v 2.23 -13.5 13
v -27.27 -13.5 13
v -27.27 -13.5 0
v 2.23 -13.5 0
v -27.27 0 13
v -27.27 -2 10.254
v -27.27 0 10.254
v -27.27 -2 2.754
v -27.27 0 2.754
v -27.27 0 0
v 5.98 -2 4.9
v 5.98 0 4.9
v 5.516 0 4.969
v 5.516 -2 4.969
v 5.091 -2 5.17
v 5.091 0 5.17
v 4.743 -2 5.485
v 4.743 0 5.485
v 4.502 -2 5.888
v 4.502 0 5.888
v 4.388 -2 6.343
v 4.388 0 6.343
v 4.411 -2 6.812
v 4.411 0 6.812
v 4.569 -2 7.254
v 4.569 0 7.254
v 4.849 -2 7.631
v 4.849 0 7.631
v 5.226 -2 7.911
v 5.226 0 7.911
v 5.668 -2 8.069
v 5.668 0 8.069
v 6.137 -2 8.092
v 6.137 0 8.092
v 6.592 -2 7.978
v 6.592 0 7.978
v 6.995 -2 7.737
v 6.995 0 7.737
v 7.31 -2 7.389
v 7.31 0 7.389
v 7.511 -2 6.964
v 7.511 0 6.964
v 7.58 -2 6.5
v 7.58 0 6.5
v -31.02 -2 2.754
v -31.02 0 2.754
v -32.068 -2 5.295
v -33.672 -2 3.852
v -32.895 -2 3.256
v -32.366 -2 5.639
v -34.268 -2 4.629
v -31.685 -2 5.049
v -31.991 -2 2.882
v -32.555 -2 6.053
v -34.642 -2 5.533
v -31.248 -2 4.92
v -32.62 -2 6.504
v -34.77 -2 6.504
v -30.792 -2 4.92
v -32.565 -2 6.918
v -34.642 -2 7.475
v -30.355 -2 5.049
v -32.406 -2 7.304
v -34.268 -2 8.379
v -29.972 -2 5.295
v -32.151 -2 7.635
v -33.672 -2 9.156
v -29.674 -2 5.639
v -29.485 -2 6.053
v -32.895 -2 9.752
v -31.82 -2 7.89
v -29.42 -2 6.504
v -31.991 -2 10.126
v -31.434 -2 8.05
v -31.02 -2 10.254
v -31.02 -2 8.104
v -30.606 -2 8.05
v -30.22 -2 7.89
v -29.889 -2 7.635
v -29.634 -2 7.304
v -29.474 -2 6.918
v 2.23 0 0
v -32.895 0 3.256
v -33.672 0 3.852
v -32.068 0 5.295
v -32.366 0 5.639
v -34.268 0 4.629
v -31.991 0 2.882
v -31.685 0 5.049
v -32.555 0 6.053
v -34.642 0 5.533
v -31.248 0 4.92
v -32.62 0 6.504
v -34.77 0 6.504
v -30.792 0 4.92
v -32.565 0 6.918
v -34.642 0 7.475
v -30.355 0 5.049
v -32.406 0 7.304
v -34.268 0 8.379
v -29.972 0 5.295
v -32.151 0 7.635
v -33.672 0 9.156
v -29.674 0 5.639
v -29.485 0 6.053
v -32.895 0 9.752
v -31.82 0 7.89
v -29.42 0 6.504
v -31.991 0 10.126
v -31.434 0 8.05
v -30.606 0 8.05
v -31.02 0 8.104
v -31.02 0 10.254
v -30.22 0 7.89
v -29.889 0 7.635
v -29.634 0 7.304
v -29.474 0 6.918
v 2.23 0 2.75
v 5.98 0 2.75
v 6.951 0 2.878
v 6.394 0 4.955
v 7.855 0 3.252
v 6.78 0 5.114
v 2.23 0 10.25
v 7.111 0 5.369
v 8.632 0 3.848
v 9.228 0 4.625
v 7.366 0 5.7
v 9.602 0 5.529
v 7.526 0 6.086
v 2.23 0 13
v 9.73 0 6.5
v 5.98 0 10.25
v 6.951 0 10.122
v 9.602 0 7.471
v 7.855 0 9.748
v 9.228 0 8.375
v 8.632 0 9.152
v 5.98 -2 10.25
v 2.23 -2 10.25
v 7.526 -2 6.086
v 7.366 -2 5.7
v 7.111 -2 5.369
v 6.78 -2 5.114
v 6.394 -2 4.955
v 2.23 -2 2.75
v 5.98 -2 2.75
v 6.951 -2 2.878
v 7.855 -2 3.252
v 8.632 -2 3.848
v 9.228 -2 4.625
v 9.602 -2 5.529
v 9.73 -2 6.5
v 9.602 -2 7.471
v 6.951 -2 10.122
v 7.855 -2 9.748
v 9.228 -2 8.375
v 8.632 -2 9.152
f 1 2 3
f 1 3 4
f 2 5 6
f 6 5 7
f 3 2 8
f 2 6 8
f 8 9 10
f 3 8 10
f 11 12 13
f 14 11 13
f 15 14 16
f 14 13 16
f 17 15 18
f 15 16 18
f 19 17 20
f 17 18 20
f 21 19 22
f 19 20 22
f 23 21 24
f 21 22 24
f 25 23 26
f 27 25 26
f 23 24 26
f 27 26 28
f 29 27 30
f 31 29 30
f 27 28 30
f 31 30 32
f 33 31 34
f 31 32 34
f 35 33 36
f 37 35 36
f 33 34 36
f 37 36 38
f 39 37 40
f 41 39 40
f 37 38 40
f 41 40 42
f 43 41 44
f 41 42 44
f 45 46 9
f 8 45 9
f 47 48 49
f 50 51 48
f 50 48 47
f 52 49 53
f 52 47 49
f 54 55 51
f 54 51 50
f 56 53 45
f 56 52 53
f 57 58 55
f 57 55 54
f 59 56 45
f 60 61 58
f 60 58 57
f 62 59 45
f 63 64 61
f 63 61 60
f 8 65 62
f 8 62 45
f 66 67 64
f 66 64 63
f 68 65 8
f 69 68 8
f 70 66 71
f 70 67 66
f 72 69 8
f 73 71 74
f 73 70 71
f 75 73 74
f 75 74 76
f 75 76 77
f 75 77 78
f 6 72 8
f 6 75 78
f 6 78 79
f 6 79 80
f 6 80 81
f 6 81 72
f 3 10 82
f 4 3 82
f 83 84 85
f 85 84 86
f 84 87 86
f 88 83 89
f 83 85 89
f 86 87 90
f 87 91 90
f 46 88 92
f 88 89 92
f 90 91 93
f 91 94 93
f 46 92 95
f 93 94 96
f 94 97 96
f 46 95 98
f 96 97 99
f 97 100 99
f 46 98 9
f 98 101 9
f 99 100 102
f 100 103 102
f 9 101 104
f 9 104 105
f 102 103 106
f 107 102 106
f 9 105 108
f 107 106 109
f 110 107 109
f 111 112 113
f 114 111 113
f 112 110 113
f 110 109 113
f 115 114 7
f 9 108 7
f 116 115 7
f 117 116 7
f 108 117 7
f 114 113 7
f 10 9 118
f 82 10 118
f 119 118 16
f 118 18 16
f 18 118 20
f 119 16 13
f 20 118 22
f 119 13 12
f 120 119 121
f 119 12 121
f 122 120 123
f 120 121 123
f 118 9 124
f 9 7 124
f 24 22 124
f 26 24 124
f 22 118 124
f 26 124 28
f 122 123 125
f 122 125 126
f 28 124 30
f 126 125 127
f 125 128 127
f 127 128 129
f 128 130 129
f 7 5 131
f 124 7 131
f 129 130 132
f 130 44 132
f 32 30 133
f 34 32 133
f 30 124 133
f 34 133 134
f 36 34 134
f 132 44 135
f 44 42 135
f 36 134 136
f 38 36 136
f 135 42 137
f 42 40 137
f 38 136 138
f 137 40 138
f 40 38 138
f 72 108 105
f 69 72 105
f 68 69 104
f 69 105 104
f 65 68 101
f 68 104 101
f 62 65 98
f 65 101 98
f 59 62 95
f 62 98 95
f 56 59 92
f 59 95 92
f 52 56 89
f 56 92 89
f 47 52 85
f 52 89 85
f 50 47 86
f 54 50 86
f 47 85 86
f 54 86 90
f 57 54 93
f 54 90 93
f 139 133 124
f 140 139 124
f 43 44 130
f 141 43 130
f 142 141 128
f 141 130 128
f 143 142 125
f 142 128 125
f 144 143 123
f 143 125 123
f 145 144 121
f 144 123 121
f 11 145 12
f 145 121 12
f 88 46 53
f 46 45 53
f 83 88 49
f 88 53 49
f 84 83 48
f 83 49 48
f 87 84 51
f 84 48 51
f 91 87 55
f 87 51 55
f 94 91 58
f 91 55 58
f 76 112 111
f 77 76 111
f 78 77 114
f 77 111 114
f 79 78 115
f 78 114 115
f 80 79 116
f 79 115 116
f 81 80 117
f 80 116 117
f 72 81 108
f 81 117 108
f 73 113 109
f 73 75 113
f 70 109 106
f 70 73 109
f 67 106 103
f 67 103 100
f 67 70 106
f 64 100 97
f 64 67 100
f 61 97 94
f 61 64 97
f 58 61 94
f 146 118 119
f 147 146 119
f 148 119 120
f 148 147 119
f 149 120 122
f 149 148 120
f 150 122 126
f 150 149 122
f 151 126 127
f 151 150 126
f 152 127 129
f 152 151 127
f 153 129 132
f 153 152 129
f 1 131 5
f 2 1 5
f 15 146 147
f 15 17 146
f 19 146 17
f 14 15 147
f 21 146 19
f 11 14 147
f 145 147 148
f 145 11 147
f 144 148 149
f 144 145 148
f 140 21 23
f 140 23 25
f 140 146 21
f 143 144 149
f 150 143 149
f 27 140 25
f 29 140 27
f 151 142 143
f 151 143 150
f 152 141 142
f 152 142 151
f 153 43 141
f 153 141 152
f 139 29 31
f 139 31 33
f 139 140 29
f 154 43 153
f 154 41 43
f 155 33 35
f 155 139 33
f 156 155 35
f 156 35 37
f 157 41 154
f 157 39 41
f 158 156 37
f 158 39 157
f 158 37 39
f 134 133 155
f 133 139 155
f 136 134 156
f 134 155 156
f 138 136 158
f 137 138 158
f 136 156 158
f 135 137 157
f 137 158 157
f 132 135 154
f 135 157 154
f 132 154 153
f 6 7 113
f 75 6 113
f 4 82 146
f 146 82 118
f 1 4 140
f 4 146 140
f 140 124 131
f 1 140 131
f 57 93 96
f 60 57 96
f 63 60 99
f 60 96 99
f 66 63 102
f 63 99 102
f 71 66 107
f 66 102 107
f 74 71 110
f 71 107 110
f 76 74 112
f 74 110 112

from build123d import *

# Parameters (mm, degrees)
F1_DEPTH = 13.5
F2_DEPTH = 2
F3_R     = 3.74999
F4_DEPTH = 2
F5_R     = 3.74999


# Not quite as in the source:
# - a fillet or chamfer is up to 0.001 mm smaller than in the source, because OpenCascade refuses the exact size
# - a feature names something its author has since deleted; it is built from what else it names


with BuildPart() as f1:
    # F0 (on Front) → F1 (new body)
    with BuildSketch(Plane.XZ):
        Polygon((2.2300408515, 13), (-27.2699591485, 13), (-27.2699591485, 10.2540537994), (-27.2699591485, 2.7540537994), (-27.2699591485, 0), (2.2300408515, 0), (2.2300408515, 2.75), (2.2300408515, 10.25), align=None)
    extrude(amount=F1_DEPTH)

    # F0 (on Front) → F2 (join)
    with BuildSketch(Plane.XZ):
        with BuildLine():
            Line((-27.2699591485, 2.7540537994), (-27.2699591485, 10.2540537994))
            Line((-27.2699591485, 10.2540537994), (-31.0199591485, 10.2540537994))
            Line((-31.0199591485, 10.2540537994), (-31.0199591485, 8.1040537994))
            ThreePointArc((-31.0199591485, 8.1040537994), (-29.8885882986, 7.6354246493), (-29.4199591485, 6.5040537994))
            ThreePointArc((-29.4199591485, 6.5040537994), (-31.0199591485, 4.9040537994), (-32.6199591485, 6.5040537994))
            Line((-32.6199591485, 6.5040537994), (-34.7699591485, 6.5040537994))
            Line((-34.7699591485, 6.5040537994), (-34.7699591485, 2.7540537994))
            Line((-34.7699591485, 2.7540537994), (-27.2699591485, 2.7540537994))
        make_face()
        with BuildLine():
            Line((-31.0199591485, 8.1040537994), (-31.0199591485, 10.2540537994))
            Line((-31.0199591485, 10.2540537994), (-34.7699591485, 10.2540537994))
            Line((-34.7699591485, 10.2540537994), (-34.7699591485, 6.5040537994))
            Line((-34.7699591485, 6.5040537994), (-32.6199591485, 6.5040537994))
            ThreePointArc((-32.6199591485, 6.5040537994), (-32.1513299984, 7.6354246493), (-31.0199591485, 8.1040537994))
        make_face()
    extrude(amount=F2_DEPTH)

    # F3 (radius 3.75 in the source; OpenCascade refuses exactly that, so slightly less here)
    f3_edges = [f1.edges().sort_by_distance(p)[0] for p in [
        (-34.769959, -1, 10.254054),
        (-34.769959, -1, 2.754054),
    ]]
    fillet(f3_edges, radius=F3_R)

    # F0 (on Front) → F4 (join)
    with BuildSketch(Plane.XZ):
        with BuildLine():
            Line((9.7300408515, 10.25), (2.2300408515, 10.25))
            Line((2.2300408515, 10.25), (2.2300408515, 2.75))
            Line((2.2300408515, 2.75), (5.9800408515, 2.75))
            Line((5.9800408515, 2.75), (5.9800408515, 4.9))
            ThreePointArc((5.9800408515, 4.9), (4.8486700016, 7.6313708499), (7.5800408515, 6.5))
            Line((7.5800408515, 6.5), (9.7300408515, 6.5))
            Line((9.7300408515, 6.5), (9.7300408515, 10.25))
        make_face()
        with BuildLine():
            Line((5.9800408515, 4.9), (5.9800408515, 2.75))
            Line((5.9800408515, 2.75), (9.7300408515, 2.75))
            Line((9.7300408515, 2.75), (9.7300408515, 6.5))
            Line((9.7300408515, 6.5), (7.5800408515, 6.5))
            ThreePointArc((7.5800408515, 6.5), (7.1114117014, 5.3686291501), (5.9800408515, 4.9))
        make_face()
    extrude(amount=F4_DEPTH)

    # F5 (radius 3.75 in the source; OpenCascade refuses exactly that, so slightly less here)
    f5_edges = [f1.edges().sort_by_distance(p)[0] for p in [
        (9.730041, -1, 10.25),
        (9.730041, -1, 2.75),
    ]]
    fillet(f5_edges, radius=F5_R)


solid = f1.part
